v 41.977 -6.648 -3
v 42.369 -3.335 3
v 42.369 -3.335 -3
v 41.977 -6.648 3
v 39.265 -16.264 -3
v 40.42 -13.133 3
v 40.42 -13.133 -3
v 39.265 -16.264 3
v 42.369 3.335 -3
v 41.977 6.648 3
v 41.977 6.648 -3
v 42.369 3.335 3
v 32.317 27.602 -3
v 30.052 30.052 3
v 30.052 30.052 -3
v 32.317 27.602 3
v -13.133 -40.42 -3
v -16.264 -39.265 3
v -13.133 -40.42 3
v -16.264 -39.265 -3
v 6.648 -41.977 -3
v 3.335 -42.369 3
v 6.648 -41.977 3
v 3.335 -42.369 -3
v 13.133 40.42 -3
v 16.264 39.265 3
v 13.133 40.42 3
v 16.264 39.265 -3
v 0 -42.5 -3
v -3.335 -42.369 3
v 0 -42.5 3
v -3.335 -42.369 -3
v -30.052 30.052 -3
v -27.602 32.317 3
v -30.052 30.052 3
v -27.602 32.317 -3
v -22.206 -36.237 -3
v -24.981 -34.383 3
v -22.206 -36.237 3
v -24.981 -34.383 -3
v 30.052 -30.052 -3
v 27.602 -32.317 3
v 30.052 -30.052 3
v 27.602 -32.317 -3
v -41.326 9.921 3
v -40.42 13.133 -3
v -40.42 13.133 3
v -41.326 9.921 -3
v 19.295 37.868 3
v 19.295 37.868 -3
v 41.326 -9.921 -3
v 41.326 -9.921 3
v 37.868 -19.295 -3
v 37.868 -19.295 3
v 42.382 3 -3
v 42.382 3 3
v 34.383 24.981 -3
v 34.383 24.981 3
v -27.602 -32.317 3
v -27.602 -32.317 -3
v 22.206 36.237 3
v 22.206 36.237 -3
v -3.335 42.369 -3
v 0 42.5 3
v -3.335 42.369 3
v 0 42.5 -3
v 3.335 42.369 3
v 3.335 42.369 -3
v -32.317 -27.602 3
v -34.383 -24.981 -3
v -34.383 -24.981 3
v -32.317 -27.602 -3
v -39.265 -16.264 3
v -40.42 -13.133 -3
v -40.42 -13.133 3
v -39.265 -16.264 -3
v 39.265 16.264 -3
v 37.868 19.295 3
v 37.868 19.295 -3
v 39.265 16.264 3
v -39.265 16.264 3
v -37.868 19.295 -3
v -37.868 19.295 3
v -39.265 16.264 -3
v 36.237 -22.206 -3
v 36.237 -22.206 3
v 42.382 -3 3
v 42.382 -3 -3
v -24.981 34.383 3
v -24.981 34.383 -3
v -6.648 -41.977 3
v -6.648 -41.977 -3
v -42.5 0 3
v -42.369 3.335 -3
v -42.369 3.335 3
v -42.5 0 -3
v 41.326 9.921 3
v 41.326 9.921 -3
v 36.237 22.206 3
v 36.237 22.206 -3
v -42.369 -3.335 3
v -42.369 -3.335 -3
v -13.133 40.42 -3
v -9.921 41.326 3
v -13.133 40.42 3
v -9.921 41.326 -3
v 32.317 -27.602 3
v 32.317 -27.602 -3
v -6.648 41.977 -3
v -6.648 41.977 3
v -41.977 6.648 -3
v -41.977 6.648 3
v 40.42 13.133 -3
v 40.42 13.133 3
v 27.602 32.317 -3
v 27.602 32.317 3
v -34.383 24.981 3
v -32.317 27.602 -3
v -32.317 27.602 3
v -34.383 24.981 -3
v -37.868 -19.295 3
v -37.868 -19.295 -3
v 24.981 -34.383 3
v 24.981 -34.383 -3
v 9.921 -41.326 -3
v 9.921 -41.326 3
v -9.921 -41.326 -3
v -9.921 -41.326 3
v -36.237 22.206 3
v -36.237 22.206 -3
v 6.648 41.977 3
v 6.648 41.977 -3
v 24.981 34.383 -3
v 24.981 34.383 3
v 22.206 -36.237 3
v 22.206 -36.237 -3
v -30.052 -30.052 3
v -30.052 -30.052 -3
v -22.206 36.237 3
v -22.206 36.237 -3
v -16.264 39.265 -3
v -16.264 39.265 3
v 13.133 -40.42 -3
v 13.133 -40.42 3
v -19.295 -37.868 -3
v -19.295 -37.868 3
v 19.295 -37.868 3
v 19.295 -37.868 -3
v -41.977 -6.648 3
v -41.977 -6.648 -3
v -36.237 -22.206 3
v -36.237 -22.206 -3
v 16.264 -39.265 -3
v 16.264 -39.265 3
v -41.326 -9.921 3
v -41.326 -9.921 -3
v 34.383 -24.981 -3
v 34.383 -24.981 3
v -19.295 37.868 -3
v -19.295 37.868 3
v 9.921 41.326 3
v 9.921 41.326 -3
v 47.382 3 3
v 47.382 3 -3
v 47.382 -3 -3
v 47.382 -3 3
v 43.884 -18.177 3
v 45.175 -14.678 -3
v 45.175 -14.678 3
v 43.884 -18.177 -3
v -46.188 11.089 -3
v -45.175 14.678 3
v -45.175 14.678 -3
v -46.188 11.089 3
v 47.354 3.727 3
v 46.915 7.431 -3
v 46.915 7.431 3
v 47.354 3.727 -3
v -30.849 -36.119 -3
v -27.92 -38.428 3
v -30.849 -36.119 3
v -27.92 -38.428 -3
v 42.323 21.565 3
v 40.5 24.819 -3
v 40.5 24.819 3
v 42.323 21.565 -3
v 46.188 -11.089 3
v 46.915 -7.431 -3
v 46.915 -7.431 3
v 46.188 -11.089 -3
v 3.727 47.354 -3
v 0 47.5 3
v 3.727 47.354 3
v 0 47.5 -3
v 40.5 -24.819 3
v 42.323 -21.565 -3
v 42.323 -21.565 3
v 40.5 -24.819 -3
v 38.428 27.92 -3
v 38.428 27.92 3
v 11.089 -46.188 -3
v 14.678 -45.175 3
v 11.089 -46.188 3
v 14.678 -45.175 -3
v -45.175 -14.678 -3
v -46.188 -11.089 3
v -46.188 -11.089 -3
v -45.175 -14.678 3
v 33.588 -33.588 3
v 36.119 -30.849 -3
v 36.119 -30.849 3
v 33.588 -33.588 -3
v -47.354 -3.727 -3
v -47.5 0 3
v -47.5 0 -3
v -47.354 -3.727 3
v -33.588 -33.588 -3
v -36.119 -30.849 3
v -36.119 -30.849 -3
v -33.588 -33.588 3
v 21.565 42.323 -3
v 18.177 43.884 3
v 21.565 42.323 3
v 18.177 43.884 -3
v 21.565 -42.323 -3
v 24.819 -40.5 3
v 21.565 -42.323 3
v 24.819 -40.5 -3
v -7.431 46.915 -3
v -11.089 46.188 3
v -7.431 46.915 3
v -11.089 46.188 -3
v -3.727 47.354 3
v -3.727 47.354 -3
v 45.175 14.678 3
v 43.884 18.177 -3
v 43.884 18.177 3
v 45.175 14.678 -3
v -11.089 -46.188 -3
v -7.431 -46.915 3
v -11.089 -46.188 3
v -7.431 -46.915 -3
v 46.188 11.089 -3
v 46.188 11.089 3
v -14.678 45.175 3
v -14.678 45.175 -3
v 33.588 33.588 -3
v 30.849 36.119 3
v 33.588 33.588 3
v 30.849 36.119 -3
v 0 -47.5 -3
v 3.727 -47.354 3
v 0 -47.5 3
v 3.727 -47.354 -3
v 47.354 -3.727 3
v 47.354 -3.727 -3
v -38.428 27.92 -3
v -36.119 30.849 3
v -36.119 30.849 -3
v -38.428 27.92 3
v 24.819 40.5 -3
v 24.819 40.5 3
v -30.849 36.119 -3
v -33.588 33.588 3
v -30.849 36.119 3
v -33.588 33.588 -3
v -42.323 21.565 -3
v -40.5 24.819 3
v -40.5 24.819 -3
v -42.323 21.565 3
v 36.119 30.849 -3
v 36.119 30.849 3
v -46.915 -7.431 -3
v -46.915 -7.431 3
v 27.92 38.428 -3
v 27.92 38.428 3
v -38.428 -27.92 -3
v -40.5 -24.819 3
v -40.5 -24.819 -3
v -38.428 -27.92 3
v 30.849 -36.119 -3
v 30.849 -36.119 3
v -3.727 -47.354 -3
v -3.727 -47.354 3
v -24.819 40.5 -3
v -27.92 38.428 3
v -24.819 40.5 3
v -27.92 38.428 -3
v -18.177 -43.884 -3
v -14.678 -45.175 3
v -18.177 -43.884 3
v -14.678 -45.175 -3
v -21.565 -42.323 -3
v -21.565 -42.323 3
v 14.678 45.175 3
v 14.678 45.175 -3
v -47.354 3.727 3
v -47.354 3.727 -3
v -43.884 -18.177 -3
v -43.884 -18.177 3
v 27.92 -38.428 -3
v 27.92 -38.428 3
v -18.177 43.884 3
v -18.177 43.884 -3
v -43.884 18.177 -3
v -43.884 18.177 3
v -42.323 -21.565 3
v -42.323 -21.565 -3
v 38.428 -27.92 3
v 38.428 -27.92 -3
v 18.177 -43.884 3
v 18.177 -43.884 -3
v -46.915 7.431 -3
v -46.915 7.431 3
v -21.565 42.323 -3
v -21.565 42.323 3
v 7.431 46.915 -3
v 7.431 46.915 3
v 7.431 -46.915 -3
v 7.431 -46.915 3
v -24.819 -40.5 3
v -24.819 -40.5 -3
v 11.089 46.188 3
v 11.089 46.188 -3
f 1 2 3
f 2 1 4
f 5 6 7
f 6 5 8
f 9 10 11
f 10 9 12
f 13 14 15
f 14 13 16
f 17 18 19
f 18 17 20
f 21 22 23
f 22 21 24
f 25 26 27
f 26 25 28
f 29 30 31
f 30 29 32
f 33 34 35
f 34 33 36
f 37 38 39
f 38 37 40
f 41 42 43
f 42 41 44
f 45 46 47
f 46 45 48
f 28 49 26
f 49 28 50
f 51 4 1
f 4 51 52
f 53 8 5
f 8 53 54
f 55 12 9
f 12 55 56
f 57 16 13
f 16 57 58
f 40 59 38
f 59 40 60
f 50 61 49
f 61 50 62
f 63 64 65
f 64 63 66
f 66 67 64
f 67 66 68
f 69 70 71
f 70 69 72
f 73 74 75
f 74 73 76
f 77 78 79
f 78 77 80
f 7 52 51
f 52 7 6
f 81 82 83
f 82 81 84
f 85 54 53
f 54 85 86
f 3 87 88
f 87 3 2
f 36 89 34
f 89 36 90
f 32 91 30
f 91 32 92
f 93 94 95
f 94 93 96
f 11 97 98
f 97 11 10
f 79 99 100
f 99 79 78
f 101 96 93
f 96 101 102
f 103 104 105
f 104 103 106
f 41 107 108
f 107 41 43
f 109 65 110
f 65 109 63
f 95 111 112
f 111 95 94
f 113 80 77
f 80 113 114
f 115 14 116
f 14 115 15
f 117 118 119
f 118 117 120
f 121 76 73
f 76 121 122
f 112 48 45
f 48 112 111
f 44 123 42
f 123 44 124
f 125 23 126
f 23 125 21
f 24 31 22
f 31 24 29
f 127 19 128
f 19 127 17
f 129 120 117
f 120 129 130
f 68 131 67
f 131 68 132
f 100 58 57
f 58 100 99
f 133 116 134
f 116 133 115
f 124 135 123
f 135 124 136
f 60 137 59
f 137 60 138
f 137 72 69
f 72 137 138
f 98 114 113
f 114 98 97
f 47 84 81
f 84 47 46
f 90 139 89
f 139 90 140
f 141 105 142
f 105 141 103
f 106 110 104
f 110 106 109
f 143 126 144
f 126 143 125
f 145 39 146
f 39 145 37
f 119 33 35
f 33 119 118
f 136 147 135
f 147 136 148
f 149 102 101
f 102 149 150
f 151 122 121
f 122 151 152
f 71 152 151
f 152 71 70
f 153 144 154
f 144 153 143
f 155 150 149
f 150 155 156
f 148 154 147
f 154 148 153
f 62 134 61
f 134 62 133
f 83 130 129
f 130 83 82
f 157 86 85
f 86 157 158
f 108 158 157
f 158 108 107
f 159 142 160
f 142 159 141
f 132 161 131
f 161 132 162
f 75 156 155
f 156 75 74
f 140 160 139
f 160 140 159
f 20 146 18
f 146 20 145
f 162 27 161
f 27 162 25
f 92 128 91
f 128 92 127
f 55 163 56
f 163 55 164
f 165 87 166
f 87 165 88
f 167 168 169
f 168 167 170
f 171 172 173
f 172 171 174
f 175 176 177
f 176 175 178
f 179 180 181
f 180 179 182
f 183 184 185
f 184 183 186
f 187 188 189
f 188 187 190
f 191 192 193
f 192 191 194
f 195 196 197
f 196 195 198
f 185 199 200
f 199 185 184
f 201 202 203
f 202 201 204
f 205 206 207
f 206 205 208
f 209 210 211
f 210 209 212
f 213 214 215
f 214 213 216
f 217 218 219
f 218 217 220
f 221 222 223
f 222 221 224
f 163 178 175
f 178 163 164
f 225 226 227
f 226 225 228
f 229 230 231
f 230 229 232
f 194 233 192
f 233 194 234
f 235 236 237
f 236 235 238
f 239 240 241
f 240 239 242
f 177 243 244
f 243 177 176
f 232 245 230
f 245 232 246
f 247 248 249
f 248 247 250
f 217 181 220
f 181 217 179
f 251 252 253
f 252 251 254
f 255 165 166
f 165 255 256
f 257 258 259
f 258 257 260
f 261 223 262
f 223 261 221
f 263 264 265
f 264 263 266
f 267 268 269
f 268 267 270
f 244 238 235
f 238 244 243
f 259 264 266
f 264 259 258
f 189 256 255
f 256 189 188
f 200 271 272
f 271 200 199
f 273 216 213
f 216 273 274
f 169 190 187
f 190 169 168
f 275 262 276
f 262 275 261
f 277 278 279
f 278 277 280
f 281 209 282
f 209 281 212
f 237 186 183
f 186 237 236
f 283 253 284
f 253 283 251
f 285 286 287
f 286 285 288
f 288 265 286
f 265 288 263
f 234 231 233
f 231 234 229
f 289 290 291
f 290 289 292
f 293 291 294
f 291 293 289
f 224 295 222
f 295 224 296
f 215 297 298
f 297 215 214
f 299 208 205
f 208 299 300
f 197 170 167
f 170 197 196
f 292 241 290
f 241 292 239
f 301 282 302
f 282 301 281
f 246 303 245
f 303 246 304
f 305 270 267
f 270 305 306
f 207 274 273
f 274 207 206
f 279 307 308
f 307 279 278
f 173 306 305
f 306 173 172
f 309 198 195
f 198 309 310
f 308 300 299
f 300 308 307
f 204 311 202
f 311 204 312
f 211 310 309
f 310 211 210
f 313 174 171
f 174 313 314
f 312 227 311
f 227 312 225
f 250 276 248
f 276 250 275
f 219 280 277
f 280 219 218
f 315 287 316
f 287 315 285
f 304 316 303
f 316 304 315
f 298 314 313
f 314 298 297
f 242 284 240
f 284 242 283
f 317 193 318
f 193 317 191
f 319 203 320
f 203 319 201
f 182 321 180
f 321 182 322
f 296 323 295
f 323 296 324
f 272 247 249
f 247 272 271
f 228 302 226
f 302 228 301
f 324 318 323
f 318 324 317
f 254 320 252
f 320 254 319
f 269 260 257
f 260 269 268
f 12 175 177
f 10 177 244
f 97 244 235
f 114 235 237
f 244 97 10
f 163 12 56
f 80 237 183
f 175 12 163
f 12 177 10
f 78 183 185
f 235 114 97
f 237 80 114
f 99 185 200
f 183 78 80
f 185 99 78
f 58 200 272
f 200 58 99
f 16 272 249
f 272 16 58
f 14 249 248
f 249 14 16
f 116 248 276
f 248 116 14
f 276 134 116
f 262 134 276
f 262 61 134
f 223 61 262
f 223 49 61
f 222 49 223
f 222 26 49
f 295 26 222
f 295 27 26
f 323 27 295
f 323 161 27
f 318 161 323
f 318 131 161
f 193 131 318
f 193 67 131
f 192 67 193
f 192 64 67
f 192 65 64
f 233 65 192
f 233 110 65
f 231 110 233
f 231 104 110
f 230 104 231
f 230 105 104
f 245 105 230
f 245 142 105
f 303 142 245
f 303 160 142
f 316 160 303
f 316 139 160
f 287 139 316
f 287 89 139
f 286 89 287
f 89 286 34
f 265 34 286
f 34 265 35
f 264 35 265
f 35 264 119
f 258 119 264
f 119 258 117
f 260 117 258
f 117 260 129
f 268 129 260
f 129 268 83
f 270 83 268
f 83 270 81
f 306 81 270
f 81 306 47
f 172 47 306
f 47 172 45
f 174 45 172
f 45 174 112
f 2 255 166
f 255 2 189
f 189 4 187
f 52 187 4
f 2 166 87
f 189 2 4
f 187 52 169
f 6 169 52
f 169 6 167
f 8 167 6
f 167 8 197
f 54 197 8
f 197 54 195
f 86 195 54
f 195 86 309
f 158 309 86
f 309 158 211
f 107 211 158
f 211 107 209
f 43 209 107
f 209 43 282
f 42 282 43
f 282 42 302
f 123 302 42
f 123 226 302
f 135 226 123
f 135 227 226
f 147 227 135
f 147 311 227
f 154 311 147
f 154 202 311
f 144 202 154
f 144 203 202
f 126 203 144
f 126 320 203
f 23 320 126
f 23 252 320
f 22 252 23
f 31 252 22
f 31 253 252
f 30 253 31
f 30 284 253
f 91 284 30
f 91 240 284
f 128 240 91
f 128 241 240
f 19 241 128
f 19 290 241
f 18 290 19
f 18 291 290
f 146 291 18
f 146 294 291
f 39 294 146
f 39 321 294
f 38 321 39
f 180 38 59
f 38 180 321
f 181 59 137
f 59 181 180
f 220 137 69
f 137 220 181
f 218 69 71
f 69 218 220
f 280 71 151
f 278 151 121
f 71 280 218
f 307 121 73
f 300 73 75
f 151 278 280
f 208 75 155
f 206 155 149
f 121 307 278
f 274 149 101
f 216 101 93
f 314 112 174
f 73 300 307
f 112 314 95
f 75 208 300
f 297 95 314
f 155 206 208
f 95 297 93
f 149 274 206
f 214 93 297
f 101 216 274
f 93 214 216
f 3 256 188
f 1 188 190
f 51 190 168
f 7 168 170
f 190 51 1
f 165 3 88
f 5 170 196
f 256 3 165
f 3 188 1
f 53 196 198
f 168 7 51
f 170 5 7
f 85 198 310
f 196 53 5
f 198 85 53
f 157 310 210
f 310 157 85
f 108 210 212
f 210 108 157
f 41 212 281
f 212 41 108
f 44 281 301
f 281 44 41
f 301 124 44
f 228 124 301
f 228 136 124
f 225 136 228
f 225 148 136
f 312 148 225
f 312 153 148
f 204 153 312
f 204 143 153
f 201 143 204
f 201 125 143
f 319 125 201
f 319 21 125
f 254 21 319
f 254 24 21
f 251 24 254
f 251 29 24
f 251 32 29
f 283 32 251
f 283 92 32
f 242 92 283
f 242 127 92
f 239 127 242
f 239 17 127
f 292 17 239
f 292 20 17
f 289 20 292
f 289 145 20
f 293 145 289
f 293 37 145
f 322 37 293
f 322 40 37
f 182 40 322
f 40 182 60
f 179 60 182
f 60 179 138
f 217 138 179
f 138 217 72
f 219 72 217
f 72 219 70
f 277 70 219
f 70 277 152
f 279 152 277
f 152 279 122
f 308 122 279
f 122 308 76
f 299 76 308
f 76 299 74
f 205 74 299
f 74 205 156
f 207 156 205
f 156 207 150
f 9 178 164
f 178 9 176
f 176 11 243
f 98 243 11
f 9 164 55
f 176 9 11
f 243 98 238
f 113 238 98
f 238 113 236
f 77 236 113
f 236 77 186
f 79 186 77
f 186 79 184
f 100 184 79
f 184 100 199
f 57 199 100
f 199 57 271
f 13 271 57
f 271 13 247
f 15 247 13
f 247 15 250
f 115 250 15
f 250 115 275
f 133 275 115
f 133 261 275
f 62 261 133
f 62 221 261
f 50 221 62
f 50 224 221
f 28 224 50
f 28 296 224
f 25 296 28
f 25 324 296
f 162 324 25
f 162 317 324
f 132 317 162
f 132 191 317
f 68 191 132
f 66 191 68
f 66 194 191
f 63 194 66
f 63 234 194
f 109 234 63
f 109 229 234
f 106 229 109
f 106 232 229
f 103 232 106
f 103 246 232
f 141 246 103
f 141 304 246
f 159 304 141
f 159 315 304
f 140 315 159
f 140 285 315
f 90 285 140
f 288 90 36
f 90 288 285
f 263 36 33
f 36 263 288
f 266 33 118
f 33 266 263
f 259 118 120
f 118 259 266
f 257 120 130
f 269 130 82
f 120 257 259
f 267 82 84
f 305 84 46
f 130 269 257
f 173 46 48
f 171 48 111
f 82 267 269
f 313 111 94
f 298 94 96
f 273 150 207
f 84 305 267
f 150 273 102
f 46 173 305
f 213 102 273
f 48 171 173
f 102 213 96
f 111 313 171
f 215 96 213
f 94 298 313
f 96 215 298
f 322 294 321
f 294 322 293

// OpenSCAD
use <lib/shortcuts.scad>

$fn=80;

ri=85/2;
ra=95/2;
rk=6/2;

D() {
Cy(r=ra, h=2*rk);
Cy(r=ri, h=2*rk+0.1);
Tx(ri) Cu(2*ri,rk*2,rk*2+0.1);
}
